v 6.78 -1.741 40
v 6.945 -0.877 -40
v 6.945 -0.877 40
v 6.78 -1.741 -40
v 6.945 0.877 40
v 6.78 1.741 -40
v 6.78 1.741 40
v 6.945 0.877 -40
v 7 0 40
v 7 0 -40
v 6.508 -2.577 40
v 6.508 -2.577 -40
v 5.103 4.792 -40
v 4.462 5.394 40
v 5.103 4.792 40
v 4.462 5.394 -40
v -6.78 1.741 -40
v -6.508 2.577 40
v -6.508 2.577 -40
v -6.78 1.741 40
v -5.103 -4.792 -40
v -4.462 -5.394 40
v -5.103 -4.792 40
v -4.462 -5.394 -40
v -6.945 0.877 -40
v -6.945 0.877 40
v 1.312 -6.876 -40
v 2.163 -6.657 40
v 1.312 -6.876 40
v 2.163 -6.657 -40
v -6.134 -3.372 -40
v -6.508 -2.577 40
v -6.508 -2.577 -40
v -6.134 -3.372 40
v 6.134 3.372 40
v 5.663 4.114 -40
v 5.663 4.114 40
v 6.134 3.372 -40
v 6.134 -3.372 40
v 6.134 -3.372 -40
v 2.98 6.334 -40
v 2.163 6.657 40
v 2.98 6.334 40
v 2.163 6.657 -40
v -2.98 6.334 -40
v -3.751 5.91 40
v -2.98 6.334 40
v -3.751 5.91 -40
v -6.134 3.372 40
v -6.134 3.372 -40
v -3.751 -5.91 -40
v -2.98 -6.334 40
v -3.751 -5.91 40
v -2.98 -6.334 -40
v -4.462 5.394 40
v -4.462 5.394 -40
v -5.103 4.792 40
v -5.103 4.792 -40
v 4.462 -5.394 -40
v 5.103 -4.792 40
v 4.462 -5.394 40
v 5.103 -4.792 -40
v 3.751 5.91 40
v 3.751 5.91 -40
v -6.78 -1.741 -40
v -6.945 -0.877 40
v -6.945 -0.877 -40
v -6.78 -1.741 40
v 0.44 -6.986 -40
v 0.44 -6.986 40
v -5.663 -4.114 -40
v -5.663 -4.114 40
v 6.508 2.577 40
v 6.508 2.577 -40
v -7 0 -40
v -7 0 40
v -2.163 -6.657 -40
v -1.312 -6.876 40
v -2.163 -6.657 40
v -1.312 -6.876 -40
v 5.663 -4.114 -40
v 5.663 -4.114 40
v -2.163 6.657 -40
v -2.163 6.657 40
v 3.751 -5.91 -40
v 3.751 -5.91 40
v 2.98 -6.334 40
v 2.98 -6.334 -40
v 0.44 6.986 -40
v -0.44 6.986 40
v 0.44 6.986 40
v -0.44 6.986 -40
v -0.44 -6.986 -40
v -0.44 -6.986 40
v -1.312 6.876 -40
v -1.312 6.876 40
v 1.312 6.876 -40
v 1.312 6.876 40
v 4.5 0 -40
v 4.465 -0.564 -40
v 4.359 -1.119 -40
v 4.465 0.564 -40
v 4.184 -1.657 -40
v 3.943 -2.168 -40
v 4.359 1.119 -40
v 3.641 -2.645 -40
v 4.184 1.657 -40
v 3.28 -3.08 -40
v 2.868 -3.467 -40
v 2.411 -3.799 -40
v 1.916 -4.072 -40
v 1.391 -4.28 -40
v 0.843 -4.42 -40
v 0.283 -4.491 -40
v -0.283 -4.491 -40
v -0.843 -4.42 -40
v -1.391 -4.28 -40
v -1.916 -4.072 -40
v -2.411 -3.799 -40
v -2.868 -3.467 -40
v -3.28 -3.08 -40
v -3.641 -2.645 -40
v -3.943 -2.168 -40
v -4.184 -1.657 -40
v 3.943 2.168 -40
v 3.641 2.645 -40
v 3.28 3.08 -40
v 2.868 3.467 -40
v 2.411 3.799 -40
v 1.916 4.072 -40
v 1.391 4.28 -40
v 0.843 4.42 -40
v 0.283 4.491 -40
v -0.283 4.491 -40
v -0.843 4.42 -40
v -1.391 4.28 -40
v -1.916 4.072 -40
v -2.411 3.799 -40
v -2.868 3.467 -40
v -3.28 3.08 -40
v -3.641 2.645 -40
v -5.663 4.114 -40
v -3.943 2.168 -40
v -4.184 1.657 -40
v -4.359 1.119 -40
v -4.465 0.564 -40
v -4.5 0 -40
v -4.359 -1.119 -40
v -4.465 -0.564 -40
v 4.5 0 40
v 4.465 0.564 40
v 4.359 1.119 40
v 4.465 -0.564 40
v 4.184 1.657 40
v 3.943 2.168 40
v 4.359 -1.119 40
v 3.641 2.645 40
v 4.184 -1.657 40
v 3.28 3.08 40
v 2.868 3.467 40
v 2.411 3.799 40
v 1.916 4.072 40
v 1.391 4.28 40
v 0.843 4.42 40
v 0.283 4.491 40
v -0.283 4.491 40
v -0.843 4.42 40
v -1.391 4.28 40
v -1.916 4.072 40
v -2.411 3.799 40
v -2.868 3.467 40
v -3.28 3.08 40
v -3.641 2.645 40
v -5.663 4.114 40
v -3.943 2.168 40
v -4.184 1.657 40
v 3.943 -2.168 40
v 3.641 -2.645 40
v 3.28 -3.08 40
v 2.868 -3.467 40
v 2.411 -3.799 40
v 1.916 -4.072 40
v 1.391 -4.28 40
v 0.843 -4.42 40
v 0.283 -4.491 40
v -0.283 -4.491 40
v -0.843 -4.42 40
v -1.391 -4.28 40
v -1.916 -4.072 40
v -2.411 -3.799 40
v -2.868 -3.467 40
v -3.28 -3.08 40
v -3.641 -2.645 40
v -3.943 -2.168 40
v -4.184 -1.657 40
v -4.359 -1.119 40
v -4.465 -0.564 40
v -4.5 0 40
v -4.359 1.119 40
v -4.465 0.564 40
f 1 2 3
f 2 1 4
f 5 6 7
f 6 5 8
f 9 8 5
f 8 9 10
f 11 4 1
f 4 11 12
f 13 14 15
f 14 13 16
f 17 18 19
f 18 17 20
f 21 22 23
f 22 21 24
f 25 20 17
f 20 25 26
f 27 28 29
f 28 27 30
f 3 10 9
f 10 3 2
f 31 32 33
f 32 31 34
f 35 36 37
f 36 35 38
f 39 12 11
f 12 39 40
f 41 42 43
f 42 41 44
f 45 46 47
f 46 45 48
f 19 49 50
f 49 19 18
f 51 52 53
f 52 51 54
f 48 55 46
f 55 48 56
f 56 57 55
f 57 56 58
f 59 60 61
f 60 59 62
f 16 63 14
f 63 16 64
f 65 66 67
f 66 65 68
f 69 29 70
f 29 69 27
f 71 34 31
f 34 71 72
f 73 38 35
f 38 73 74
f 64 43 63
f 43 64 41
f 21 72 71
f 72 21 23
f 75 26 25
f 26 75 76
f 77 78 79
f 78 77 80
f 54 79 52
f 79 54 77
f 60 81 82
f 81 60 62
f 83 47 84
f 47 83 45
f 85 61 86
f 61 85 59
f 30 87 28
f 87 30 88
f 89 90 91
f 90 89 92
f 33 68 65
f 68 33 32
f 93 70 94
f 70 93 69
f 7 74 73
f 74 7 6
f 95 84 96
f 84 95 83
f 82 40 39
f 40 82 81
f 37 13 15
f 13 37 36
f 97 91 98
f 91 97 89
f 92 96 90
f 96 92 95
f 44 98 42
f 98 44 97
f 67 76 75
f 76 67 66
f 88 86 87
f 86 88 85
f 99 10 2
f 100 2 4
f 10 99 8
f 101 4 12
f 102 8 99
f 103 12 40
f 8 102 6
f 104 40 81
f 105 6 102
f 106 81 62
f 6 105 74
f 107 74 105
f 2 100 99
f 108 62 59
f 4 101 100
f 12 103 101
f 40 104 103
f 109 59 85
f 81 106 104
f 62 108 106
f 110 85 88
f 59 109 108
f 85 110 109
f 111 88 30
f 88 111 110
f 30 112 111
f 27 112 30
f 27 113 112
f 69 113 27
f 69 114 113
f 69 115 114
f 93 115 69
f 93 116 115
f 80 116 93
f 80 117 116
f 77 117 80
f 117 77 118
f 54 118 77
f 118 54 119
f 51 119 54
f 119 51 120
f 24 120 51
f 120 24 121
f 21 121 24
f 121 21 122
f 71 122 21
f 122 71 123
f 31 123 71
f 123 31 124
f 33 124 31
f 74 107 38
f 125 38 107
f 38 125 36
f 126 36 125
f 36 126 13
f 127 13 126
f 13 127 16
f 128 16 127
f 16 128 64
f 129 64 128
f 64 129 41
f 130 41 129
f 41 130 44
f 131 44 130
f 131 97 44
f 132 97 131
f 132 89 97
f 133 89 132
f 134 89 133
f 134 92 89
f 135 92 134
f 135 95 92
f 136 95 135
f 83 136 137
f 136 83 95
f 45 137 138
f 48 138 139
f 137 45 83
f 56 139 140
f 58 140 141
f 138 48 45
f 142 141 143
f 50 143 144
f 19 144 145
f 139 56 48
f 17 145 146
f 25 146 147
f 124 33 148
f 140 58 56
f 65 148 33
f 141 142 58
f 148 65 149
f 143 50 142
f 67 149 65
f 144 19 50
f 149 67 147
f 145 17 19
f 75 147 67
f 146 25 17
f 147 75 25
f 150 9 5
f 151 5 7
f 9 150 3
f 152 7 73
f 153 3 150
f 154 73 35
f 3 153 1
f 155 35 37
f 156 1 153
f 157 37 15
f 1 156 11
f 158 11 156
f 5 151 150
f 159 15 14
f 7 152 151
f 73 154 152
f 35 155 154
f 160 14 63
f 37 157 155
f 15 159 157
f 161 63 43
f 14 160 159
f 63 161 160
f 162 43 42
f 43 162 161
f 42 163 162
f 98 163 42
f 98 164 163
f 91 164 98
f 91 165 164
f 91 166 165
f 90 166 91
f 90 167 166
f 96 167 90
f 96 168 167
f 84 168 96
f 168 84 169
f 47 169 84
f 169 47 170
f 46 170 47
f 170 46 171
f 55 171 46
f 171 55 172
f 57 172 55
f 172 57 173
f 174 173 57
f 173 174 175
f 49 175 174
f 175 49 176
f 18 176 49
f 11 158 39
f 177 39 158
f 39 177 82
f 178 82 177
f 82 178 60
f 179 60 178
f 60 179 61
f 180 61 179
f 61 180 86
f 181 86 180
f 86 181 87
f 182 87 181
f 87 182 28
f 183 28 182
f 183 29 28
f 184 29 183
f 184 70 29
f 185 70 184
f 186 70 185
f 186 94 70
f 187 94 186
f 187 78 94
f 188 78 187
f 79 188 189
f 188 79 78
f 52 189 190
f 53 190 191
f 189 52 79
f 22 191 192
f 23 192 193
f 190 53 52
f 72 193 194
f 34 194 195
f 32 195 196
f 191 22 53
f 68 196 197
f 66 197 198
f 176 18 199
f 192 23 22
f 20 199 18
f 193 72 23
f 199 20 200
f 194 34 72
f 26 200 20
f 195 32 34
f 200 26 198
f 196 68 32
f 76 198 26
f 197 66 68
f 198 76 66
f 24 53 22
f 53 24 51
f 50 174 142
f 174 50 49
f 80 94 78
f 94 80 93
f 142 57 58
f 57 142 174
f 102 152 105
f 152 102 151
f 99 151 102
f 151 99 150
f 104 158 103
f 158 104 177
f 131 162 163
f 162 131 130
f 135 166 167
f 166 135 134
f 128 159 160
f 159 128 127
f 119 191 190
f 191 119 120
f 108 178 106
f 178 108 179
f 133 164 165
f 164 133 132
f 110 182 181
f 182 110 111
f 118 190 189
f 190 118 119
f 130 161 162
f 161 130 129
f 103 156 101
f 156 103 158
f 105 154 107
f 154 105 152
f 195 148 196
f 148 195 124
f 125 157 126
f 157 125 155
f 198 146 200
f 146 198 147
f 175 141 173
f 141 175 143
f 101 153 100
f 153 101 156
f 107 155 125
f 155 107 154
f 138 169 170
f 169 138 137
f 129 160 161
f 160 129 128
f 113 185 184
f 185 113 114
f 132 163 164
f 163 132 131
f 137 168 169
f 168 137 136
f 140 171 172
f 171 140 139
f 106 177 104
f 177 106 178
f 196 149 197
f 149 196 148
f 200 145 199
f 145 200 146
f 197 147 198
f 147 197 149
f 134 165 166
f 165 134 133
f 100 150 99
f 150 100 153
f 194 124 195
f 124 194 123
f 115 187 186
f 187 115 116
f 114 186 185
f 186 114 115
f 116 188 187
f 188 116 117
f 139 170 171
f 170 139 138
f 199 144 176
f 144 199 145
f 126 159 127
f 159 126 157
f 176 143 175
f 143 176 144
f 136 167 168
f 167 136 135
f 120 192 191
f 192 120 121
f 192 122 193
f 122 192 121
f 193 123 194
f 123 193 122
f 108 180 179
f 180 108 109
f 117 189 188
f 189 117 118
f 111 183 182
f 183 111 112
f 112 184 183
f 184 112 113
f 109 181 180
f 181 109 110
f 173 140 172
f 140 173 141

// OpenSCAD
$fn = 50;


difference() {
	union() {
		translate(v = [0, 0, -40.0000000000]) {
			cylinder(h = 80, r = 7.0000000000);
		}
	}
	union() {
		translate(v = [0, 0, -100.0000000000]) {
			cylinder(h = 200, r = 4.5000000000);
		}
	}
}
